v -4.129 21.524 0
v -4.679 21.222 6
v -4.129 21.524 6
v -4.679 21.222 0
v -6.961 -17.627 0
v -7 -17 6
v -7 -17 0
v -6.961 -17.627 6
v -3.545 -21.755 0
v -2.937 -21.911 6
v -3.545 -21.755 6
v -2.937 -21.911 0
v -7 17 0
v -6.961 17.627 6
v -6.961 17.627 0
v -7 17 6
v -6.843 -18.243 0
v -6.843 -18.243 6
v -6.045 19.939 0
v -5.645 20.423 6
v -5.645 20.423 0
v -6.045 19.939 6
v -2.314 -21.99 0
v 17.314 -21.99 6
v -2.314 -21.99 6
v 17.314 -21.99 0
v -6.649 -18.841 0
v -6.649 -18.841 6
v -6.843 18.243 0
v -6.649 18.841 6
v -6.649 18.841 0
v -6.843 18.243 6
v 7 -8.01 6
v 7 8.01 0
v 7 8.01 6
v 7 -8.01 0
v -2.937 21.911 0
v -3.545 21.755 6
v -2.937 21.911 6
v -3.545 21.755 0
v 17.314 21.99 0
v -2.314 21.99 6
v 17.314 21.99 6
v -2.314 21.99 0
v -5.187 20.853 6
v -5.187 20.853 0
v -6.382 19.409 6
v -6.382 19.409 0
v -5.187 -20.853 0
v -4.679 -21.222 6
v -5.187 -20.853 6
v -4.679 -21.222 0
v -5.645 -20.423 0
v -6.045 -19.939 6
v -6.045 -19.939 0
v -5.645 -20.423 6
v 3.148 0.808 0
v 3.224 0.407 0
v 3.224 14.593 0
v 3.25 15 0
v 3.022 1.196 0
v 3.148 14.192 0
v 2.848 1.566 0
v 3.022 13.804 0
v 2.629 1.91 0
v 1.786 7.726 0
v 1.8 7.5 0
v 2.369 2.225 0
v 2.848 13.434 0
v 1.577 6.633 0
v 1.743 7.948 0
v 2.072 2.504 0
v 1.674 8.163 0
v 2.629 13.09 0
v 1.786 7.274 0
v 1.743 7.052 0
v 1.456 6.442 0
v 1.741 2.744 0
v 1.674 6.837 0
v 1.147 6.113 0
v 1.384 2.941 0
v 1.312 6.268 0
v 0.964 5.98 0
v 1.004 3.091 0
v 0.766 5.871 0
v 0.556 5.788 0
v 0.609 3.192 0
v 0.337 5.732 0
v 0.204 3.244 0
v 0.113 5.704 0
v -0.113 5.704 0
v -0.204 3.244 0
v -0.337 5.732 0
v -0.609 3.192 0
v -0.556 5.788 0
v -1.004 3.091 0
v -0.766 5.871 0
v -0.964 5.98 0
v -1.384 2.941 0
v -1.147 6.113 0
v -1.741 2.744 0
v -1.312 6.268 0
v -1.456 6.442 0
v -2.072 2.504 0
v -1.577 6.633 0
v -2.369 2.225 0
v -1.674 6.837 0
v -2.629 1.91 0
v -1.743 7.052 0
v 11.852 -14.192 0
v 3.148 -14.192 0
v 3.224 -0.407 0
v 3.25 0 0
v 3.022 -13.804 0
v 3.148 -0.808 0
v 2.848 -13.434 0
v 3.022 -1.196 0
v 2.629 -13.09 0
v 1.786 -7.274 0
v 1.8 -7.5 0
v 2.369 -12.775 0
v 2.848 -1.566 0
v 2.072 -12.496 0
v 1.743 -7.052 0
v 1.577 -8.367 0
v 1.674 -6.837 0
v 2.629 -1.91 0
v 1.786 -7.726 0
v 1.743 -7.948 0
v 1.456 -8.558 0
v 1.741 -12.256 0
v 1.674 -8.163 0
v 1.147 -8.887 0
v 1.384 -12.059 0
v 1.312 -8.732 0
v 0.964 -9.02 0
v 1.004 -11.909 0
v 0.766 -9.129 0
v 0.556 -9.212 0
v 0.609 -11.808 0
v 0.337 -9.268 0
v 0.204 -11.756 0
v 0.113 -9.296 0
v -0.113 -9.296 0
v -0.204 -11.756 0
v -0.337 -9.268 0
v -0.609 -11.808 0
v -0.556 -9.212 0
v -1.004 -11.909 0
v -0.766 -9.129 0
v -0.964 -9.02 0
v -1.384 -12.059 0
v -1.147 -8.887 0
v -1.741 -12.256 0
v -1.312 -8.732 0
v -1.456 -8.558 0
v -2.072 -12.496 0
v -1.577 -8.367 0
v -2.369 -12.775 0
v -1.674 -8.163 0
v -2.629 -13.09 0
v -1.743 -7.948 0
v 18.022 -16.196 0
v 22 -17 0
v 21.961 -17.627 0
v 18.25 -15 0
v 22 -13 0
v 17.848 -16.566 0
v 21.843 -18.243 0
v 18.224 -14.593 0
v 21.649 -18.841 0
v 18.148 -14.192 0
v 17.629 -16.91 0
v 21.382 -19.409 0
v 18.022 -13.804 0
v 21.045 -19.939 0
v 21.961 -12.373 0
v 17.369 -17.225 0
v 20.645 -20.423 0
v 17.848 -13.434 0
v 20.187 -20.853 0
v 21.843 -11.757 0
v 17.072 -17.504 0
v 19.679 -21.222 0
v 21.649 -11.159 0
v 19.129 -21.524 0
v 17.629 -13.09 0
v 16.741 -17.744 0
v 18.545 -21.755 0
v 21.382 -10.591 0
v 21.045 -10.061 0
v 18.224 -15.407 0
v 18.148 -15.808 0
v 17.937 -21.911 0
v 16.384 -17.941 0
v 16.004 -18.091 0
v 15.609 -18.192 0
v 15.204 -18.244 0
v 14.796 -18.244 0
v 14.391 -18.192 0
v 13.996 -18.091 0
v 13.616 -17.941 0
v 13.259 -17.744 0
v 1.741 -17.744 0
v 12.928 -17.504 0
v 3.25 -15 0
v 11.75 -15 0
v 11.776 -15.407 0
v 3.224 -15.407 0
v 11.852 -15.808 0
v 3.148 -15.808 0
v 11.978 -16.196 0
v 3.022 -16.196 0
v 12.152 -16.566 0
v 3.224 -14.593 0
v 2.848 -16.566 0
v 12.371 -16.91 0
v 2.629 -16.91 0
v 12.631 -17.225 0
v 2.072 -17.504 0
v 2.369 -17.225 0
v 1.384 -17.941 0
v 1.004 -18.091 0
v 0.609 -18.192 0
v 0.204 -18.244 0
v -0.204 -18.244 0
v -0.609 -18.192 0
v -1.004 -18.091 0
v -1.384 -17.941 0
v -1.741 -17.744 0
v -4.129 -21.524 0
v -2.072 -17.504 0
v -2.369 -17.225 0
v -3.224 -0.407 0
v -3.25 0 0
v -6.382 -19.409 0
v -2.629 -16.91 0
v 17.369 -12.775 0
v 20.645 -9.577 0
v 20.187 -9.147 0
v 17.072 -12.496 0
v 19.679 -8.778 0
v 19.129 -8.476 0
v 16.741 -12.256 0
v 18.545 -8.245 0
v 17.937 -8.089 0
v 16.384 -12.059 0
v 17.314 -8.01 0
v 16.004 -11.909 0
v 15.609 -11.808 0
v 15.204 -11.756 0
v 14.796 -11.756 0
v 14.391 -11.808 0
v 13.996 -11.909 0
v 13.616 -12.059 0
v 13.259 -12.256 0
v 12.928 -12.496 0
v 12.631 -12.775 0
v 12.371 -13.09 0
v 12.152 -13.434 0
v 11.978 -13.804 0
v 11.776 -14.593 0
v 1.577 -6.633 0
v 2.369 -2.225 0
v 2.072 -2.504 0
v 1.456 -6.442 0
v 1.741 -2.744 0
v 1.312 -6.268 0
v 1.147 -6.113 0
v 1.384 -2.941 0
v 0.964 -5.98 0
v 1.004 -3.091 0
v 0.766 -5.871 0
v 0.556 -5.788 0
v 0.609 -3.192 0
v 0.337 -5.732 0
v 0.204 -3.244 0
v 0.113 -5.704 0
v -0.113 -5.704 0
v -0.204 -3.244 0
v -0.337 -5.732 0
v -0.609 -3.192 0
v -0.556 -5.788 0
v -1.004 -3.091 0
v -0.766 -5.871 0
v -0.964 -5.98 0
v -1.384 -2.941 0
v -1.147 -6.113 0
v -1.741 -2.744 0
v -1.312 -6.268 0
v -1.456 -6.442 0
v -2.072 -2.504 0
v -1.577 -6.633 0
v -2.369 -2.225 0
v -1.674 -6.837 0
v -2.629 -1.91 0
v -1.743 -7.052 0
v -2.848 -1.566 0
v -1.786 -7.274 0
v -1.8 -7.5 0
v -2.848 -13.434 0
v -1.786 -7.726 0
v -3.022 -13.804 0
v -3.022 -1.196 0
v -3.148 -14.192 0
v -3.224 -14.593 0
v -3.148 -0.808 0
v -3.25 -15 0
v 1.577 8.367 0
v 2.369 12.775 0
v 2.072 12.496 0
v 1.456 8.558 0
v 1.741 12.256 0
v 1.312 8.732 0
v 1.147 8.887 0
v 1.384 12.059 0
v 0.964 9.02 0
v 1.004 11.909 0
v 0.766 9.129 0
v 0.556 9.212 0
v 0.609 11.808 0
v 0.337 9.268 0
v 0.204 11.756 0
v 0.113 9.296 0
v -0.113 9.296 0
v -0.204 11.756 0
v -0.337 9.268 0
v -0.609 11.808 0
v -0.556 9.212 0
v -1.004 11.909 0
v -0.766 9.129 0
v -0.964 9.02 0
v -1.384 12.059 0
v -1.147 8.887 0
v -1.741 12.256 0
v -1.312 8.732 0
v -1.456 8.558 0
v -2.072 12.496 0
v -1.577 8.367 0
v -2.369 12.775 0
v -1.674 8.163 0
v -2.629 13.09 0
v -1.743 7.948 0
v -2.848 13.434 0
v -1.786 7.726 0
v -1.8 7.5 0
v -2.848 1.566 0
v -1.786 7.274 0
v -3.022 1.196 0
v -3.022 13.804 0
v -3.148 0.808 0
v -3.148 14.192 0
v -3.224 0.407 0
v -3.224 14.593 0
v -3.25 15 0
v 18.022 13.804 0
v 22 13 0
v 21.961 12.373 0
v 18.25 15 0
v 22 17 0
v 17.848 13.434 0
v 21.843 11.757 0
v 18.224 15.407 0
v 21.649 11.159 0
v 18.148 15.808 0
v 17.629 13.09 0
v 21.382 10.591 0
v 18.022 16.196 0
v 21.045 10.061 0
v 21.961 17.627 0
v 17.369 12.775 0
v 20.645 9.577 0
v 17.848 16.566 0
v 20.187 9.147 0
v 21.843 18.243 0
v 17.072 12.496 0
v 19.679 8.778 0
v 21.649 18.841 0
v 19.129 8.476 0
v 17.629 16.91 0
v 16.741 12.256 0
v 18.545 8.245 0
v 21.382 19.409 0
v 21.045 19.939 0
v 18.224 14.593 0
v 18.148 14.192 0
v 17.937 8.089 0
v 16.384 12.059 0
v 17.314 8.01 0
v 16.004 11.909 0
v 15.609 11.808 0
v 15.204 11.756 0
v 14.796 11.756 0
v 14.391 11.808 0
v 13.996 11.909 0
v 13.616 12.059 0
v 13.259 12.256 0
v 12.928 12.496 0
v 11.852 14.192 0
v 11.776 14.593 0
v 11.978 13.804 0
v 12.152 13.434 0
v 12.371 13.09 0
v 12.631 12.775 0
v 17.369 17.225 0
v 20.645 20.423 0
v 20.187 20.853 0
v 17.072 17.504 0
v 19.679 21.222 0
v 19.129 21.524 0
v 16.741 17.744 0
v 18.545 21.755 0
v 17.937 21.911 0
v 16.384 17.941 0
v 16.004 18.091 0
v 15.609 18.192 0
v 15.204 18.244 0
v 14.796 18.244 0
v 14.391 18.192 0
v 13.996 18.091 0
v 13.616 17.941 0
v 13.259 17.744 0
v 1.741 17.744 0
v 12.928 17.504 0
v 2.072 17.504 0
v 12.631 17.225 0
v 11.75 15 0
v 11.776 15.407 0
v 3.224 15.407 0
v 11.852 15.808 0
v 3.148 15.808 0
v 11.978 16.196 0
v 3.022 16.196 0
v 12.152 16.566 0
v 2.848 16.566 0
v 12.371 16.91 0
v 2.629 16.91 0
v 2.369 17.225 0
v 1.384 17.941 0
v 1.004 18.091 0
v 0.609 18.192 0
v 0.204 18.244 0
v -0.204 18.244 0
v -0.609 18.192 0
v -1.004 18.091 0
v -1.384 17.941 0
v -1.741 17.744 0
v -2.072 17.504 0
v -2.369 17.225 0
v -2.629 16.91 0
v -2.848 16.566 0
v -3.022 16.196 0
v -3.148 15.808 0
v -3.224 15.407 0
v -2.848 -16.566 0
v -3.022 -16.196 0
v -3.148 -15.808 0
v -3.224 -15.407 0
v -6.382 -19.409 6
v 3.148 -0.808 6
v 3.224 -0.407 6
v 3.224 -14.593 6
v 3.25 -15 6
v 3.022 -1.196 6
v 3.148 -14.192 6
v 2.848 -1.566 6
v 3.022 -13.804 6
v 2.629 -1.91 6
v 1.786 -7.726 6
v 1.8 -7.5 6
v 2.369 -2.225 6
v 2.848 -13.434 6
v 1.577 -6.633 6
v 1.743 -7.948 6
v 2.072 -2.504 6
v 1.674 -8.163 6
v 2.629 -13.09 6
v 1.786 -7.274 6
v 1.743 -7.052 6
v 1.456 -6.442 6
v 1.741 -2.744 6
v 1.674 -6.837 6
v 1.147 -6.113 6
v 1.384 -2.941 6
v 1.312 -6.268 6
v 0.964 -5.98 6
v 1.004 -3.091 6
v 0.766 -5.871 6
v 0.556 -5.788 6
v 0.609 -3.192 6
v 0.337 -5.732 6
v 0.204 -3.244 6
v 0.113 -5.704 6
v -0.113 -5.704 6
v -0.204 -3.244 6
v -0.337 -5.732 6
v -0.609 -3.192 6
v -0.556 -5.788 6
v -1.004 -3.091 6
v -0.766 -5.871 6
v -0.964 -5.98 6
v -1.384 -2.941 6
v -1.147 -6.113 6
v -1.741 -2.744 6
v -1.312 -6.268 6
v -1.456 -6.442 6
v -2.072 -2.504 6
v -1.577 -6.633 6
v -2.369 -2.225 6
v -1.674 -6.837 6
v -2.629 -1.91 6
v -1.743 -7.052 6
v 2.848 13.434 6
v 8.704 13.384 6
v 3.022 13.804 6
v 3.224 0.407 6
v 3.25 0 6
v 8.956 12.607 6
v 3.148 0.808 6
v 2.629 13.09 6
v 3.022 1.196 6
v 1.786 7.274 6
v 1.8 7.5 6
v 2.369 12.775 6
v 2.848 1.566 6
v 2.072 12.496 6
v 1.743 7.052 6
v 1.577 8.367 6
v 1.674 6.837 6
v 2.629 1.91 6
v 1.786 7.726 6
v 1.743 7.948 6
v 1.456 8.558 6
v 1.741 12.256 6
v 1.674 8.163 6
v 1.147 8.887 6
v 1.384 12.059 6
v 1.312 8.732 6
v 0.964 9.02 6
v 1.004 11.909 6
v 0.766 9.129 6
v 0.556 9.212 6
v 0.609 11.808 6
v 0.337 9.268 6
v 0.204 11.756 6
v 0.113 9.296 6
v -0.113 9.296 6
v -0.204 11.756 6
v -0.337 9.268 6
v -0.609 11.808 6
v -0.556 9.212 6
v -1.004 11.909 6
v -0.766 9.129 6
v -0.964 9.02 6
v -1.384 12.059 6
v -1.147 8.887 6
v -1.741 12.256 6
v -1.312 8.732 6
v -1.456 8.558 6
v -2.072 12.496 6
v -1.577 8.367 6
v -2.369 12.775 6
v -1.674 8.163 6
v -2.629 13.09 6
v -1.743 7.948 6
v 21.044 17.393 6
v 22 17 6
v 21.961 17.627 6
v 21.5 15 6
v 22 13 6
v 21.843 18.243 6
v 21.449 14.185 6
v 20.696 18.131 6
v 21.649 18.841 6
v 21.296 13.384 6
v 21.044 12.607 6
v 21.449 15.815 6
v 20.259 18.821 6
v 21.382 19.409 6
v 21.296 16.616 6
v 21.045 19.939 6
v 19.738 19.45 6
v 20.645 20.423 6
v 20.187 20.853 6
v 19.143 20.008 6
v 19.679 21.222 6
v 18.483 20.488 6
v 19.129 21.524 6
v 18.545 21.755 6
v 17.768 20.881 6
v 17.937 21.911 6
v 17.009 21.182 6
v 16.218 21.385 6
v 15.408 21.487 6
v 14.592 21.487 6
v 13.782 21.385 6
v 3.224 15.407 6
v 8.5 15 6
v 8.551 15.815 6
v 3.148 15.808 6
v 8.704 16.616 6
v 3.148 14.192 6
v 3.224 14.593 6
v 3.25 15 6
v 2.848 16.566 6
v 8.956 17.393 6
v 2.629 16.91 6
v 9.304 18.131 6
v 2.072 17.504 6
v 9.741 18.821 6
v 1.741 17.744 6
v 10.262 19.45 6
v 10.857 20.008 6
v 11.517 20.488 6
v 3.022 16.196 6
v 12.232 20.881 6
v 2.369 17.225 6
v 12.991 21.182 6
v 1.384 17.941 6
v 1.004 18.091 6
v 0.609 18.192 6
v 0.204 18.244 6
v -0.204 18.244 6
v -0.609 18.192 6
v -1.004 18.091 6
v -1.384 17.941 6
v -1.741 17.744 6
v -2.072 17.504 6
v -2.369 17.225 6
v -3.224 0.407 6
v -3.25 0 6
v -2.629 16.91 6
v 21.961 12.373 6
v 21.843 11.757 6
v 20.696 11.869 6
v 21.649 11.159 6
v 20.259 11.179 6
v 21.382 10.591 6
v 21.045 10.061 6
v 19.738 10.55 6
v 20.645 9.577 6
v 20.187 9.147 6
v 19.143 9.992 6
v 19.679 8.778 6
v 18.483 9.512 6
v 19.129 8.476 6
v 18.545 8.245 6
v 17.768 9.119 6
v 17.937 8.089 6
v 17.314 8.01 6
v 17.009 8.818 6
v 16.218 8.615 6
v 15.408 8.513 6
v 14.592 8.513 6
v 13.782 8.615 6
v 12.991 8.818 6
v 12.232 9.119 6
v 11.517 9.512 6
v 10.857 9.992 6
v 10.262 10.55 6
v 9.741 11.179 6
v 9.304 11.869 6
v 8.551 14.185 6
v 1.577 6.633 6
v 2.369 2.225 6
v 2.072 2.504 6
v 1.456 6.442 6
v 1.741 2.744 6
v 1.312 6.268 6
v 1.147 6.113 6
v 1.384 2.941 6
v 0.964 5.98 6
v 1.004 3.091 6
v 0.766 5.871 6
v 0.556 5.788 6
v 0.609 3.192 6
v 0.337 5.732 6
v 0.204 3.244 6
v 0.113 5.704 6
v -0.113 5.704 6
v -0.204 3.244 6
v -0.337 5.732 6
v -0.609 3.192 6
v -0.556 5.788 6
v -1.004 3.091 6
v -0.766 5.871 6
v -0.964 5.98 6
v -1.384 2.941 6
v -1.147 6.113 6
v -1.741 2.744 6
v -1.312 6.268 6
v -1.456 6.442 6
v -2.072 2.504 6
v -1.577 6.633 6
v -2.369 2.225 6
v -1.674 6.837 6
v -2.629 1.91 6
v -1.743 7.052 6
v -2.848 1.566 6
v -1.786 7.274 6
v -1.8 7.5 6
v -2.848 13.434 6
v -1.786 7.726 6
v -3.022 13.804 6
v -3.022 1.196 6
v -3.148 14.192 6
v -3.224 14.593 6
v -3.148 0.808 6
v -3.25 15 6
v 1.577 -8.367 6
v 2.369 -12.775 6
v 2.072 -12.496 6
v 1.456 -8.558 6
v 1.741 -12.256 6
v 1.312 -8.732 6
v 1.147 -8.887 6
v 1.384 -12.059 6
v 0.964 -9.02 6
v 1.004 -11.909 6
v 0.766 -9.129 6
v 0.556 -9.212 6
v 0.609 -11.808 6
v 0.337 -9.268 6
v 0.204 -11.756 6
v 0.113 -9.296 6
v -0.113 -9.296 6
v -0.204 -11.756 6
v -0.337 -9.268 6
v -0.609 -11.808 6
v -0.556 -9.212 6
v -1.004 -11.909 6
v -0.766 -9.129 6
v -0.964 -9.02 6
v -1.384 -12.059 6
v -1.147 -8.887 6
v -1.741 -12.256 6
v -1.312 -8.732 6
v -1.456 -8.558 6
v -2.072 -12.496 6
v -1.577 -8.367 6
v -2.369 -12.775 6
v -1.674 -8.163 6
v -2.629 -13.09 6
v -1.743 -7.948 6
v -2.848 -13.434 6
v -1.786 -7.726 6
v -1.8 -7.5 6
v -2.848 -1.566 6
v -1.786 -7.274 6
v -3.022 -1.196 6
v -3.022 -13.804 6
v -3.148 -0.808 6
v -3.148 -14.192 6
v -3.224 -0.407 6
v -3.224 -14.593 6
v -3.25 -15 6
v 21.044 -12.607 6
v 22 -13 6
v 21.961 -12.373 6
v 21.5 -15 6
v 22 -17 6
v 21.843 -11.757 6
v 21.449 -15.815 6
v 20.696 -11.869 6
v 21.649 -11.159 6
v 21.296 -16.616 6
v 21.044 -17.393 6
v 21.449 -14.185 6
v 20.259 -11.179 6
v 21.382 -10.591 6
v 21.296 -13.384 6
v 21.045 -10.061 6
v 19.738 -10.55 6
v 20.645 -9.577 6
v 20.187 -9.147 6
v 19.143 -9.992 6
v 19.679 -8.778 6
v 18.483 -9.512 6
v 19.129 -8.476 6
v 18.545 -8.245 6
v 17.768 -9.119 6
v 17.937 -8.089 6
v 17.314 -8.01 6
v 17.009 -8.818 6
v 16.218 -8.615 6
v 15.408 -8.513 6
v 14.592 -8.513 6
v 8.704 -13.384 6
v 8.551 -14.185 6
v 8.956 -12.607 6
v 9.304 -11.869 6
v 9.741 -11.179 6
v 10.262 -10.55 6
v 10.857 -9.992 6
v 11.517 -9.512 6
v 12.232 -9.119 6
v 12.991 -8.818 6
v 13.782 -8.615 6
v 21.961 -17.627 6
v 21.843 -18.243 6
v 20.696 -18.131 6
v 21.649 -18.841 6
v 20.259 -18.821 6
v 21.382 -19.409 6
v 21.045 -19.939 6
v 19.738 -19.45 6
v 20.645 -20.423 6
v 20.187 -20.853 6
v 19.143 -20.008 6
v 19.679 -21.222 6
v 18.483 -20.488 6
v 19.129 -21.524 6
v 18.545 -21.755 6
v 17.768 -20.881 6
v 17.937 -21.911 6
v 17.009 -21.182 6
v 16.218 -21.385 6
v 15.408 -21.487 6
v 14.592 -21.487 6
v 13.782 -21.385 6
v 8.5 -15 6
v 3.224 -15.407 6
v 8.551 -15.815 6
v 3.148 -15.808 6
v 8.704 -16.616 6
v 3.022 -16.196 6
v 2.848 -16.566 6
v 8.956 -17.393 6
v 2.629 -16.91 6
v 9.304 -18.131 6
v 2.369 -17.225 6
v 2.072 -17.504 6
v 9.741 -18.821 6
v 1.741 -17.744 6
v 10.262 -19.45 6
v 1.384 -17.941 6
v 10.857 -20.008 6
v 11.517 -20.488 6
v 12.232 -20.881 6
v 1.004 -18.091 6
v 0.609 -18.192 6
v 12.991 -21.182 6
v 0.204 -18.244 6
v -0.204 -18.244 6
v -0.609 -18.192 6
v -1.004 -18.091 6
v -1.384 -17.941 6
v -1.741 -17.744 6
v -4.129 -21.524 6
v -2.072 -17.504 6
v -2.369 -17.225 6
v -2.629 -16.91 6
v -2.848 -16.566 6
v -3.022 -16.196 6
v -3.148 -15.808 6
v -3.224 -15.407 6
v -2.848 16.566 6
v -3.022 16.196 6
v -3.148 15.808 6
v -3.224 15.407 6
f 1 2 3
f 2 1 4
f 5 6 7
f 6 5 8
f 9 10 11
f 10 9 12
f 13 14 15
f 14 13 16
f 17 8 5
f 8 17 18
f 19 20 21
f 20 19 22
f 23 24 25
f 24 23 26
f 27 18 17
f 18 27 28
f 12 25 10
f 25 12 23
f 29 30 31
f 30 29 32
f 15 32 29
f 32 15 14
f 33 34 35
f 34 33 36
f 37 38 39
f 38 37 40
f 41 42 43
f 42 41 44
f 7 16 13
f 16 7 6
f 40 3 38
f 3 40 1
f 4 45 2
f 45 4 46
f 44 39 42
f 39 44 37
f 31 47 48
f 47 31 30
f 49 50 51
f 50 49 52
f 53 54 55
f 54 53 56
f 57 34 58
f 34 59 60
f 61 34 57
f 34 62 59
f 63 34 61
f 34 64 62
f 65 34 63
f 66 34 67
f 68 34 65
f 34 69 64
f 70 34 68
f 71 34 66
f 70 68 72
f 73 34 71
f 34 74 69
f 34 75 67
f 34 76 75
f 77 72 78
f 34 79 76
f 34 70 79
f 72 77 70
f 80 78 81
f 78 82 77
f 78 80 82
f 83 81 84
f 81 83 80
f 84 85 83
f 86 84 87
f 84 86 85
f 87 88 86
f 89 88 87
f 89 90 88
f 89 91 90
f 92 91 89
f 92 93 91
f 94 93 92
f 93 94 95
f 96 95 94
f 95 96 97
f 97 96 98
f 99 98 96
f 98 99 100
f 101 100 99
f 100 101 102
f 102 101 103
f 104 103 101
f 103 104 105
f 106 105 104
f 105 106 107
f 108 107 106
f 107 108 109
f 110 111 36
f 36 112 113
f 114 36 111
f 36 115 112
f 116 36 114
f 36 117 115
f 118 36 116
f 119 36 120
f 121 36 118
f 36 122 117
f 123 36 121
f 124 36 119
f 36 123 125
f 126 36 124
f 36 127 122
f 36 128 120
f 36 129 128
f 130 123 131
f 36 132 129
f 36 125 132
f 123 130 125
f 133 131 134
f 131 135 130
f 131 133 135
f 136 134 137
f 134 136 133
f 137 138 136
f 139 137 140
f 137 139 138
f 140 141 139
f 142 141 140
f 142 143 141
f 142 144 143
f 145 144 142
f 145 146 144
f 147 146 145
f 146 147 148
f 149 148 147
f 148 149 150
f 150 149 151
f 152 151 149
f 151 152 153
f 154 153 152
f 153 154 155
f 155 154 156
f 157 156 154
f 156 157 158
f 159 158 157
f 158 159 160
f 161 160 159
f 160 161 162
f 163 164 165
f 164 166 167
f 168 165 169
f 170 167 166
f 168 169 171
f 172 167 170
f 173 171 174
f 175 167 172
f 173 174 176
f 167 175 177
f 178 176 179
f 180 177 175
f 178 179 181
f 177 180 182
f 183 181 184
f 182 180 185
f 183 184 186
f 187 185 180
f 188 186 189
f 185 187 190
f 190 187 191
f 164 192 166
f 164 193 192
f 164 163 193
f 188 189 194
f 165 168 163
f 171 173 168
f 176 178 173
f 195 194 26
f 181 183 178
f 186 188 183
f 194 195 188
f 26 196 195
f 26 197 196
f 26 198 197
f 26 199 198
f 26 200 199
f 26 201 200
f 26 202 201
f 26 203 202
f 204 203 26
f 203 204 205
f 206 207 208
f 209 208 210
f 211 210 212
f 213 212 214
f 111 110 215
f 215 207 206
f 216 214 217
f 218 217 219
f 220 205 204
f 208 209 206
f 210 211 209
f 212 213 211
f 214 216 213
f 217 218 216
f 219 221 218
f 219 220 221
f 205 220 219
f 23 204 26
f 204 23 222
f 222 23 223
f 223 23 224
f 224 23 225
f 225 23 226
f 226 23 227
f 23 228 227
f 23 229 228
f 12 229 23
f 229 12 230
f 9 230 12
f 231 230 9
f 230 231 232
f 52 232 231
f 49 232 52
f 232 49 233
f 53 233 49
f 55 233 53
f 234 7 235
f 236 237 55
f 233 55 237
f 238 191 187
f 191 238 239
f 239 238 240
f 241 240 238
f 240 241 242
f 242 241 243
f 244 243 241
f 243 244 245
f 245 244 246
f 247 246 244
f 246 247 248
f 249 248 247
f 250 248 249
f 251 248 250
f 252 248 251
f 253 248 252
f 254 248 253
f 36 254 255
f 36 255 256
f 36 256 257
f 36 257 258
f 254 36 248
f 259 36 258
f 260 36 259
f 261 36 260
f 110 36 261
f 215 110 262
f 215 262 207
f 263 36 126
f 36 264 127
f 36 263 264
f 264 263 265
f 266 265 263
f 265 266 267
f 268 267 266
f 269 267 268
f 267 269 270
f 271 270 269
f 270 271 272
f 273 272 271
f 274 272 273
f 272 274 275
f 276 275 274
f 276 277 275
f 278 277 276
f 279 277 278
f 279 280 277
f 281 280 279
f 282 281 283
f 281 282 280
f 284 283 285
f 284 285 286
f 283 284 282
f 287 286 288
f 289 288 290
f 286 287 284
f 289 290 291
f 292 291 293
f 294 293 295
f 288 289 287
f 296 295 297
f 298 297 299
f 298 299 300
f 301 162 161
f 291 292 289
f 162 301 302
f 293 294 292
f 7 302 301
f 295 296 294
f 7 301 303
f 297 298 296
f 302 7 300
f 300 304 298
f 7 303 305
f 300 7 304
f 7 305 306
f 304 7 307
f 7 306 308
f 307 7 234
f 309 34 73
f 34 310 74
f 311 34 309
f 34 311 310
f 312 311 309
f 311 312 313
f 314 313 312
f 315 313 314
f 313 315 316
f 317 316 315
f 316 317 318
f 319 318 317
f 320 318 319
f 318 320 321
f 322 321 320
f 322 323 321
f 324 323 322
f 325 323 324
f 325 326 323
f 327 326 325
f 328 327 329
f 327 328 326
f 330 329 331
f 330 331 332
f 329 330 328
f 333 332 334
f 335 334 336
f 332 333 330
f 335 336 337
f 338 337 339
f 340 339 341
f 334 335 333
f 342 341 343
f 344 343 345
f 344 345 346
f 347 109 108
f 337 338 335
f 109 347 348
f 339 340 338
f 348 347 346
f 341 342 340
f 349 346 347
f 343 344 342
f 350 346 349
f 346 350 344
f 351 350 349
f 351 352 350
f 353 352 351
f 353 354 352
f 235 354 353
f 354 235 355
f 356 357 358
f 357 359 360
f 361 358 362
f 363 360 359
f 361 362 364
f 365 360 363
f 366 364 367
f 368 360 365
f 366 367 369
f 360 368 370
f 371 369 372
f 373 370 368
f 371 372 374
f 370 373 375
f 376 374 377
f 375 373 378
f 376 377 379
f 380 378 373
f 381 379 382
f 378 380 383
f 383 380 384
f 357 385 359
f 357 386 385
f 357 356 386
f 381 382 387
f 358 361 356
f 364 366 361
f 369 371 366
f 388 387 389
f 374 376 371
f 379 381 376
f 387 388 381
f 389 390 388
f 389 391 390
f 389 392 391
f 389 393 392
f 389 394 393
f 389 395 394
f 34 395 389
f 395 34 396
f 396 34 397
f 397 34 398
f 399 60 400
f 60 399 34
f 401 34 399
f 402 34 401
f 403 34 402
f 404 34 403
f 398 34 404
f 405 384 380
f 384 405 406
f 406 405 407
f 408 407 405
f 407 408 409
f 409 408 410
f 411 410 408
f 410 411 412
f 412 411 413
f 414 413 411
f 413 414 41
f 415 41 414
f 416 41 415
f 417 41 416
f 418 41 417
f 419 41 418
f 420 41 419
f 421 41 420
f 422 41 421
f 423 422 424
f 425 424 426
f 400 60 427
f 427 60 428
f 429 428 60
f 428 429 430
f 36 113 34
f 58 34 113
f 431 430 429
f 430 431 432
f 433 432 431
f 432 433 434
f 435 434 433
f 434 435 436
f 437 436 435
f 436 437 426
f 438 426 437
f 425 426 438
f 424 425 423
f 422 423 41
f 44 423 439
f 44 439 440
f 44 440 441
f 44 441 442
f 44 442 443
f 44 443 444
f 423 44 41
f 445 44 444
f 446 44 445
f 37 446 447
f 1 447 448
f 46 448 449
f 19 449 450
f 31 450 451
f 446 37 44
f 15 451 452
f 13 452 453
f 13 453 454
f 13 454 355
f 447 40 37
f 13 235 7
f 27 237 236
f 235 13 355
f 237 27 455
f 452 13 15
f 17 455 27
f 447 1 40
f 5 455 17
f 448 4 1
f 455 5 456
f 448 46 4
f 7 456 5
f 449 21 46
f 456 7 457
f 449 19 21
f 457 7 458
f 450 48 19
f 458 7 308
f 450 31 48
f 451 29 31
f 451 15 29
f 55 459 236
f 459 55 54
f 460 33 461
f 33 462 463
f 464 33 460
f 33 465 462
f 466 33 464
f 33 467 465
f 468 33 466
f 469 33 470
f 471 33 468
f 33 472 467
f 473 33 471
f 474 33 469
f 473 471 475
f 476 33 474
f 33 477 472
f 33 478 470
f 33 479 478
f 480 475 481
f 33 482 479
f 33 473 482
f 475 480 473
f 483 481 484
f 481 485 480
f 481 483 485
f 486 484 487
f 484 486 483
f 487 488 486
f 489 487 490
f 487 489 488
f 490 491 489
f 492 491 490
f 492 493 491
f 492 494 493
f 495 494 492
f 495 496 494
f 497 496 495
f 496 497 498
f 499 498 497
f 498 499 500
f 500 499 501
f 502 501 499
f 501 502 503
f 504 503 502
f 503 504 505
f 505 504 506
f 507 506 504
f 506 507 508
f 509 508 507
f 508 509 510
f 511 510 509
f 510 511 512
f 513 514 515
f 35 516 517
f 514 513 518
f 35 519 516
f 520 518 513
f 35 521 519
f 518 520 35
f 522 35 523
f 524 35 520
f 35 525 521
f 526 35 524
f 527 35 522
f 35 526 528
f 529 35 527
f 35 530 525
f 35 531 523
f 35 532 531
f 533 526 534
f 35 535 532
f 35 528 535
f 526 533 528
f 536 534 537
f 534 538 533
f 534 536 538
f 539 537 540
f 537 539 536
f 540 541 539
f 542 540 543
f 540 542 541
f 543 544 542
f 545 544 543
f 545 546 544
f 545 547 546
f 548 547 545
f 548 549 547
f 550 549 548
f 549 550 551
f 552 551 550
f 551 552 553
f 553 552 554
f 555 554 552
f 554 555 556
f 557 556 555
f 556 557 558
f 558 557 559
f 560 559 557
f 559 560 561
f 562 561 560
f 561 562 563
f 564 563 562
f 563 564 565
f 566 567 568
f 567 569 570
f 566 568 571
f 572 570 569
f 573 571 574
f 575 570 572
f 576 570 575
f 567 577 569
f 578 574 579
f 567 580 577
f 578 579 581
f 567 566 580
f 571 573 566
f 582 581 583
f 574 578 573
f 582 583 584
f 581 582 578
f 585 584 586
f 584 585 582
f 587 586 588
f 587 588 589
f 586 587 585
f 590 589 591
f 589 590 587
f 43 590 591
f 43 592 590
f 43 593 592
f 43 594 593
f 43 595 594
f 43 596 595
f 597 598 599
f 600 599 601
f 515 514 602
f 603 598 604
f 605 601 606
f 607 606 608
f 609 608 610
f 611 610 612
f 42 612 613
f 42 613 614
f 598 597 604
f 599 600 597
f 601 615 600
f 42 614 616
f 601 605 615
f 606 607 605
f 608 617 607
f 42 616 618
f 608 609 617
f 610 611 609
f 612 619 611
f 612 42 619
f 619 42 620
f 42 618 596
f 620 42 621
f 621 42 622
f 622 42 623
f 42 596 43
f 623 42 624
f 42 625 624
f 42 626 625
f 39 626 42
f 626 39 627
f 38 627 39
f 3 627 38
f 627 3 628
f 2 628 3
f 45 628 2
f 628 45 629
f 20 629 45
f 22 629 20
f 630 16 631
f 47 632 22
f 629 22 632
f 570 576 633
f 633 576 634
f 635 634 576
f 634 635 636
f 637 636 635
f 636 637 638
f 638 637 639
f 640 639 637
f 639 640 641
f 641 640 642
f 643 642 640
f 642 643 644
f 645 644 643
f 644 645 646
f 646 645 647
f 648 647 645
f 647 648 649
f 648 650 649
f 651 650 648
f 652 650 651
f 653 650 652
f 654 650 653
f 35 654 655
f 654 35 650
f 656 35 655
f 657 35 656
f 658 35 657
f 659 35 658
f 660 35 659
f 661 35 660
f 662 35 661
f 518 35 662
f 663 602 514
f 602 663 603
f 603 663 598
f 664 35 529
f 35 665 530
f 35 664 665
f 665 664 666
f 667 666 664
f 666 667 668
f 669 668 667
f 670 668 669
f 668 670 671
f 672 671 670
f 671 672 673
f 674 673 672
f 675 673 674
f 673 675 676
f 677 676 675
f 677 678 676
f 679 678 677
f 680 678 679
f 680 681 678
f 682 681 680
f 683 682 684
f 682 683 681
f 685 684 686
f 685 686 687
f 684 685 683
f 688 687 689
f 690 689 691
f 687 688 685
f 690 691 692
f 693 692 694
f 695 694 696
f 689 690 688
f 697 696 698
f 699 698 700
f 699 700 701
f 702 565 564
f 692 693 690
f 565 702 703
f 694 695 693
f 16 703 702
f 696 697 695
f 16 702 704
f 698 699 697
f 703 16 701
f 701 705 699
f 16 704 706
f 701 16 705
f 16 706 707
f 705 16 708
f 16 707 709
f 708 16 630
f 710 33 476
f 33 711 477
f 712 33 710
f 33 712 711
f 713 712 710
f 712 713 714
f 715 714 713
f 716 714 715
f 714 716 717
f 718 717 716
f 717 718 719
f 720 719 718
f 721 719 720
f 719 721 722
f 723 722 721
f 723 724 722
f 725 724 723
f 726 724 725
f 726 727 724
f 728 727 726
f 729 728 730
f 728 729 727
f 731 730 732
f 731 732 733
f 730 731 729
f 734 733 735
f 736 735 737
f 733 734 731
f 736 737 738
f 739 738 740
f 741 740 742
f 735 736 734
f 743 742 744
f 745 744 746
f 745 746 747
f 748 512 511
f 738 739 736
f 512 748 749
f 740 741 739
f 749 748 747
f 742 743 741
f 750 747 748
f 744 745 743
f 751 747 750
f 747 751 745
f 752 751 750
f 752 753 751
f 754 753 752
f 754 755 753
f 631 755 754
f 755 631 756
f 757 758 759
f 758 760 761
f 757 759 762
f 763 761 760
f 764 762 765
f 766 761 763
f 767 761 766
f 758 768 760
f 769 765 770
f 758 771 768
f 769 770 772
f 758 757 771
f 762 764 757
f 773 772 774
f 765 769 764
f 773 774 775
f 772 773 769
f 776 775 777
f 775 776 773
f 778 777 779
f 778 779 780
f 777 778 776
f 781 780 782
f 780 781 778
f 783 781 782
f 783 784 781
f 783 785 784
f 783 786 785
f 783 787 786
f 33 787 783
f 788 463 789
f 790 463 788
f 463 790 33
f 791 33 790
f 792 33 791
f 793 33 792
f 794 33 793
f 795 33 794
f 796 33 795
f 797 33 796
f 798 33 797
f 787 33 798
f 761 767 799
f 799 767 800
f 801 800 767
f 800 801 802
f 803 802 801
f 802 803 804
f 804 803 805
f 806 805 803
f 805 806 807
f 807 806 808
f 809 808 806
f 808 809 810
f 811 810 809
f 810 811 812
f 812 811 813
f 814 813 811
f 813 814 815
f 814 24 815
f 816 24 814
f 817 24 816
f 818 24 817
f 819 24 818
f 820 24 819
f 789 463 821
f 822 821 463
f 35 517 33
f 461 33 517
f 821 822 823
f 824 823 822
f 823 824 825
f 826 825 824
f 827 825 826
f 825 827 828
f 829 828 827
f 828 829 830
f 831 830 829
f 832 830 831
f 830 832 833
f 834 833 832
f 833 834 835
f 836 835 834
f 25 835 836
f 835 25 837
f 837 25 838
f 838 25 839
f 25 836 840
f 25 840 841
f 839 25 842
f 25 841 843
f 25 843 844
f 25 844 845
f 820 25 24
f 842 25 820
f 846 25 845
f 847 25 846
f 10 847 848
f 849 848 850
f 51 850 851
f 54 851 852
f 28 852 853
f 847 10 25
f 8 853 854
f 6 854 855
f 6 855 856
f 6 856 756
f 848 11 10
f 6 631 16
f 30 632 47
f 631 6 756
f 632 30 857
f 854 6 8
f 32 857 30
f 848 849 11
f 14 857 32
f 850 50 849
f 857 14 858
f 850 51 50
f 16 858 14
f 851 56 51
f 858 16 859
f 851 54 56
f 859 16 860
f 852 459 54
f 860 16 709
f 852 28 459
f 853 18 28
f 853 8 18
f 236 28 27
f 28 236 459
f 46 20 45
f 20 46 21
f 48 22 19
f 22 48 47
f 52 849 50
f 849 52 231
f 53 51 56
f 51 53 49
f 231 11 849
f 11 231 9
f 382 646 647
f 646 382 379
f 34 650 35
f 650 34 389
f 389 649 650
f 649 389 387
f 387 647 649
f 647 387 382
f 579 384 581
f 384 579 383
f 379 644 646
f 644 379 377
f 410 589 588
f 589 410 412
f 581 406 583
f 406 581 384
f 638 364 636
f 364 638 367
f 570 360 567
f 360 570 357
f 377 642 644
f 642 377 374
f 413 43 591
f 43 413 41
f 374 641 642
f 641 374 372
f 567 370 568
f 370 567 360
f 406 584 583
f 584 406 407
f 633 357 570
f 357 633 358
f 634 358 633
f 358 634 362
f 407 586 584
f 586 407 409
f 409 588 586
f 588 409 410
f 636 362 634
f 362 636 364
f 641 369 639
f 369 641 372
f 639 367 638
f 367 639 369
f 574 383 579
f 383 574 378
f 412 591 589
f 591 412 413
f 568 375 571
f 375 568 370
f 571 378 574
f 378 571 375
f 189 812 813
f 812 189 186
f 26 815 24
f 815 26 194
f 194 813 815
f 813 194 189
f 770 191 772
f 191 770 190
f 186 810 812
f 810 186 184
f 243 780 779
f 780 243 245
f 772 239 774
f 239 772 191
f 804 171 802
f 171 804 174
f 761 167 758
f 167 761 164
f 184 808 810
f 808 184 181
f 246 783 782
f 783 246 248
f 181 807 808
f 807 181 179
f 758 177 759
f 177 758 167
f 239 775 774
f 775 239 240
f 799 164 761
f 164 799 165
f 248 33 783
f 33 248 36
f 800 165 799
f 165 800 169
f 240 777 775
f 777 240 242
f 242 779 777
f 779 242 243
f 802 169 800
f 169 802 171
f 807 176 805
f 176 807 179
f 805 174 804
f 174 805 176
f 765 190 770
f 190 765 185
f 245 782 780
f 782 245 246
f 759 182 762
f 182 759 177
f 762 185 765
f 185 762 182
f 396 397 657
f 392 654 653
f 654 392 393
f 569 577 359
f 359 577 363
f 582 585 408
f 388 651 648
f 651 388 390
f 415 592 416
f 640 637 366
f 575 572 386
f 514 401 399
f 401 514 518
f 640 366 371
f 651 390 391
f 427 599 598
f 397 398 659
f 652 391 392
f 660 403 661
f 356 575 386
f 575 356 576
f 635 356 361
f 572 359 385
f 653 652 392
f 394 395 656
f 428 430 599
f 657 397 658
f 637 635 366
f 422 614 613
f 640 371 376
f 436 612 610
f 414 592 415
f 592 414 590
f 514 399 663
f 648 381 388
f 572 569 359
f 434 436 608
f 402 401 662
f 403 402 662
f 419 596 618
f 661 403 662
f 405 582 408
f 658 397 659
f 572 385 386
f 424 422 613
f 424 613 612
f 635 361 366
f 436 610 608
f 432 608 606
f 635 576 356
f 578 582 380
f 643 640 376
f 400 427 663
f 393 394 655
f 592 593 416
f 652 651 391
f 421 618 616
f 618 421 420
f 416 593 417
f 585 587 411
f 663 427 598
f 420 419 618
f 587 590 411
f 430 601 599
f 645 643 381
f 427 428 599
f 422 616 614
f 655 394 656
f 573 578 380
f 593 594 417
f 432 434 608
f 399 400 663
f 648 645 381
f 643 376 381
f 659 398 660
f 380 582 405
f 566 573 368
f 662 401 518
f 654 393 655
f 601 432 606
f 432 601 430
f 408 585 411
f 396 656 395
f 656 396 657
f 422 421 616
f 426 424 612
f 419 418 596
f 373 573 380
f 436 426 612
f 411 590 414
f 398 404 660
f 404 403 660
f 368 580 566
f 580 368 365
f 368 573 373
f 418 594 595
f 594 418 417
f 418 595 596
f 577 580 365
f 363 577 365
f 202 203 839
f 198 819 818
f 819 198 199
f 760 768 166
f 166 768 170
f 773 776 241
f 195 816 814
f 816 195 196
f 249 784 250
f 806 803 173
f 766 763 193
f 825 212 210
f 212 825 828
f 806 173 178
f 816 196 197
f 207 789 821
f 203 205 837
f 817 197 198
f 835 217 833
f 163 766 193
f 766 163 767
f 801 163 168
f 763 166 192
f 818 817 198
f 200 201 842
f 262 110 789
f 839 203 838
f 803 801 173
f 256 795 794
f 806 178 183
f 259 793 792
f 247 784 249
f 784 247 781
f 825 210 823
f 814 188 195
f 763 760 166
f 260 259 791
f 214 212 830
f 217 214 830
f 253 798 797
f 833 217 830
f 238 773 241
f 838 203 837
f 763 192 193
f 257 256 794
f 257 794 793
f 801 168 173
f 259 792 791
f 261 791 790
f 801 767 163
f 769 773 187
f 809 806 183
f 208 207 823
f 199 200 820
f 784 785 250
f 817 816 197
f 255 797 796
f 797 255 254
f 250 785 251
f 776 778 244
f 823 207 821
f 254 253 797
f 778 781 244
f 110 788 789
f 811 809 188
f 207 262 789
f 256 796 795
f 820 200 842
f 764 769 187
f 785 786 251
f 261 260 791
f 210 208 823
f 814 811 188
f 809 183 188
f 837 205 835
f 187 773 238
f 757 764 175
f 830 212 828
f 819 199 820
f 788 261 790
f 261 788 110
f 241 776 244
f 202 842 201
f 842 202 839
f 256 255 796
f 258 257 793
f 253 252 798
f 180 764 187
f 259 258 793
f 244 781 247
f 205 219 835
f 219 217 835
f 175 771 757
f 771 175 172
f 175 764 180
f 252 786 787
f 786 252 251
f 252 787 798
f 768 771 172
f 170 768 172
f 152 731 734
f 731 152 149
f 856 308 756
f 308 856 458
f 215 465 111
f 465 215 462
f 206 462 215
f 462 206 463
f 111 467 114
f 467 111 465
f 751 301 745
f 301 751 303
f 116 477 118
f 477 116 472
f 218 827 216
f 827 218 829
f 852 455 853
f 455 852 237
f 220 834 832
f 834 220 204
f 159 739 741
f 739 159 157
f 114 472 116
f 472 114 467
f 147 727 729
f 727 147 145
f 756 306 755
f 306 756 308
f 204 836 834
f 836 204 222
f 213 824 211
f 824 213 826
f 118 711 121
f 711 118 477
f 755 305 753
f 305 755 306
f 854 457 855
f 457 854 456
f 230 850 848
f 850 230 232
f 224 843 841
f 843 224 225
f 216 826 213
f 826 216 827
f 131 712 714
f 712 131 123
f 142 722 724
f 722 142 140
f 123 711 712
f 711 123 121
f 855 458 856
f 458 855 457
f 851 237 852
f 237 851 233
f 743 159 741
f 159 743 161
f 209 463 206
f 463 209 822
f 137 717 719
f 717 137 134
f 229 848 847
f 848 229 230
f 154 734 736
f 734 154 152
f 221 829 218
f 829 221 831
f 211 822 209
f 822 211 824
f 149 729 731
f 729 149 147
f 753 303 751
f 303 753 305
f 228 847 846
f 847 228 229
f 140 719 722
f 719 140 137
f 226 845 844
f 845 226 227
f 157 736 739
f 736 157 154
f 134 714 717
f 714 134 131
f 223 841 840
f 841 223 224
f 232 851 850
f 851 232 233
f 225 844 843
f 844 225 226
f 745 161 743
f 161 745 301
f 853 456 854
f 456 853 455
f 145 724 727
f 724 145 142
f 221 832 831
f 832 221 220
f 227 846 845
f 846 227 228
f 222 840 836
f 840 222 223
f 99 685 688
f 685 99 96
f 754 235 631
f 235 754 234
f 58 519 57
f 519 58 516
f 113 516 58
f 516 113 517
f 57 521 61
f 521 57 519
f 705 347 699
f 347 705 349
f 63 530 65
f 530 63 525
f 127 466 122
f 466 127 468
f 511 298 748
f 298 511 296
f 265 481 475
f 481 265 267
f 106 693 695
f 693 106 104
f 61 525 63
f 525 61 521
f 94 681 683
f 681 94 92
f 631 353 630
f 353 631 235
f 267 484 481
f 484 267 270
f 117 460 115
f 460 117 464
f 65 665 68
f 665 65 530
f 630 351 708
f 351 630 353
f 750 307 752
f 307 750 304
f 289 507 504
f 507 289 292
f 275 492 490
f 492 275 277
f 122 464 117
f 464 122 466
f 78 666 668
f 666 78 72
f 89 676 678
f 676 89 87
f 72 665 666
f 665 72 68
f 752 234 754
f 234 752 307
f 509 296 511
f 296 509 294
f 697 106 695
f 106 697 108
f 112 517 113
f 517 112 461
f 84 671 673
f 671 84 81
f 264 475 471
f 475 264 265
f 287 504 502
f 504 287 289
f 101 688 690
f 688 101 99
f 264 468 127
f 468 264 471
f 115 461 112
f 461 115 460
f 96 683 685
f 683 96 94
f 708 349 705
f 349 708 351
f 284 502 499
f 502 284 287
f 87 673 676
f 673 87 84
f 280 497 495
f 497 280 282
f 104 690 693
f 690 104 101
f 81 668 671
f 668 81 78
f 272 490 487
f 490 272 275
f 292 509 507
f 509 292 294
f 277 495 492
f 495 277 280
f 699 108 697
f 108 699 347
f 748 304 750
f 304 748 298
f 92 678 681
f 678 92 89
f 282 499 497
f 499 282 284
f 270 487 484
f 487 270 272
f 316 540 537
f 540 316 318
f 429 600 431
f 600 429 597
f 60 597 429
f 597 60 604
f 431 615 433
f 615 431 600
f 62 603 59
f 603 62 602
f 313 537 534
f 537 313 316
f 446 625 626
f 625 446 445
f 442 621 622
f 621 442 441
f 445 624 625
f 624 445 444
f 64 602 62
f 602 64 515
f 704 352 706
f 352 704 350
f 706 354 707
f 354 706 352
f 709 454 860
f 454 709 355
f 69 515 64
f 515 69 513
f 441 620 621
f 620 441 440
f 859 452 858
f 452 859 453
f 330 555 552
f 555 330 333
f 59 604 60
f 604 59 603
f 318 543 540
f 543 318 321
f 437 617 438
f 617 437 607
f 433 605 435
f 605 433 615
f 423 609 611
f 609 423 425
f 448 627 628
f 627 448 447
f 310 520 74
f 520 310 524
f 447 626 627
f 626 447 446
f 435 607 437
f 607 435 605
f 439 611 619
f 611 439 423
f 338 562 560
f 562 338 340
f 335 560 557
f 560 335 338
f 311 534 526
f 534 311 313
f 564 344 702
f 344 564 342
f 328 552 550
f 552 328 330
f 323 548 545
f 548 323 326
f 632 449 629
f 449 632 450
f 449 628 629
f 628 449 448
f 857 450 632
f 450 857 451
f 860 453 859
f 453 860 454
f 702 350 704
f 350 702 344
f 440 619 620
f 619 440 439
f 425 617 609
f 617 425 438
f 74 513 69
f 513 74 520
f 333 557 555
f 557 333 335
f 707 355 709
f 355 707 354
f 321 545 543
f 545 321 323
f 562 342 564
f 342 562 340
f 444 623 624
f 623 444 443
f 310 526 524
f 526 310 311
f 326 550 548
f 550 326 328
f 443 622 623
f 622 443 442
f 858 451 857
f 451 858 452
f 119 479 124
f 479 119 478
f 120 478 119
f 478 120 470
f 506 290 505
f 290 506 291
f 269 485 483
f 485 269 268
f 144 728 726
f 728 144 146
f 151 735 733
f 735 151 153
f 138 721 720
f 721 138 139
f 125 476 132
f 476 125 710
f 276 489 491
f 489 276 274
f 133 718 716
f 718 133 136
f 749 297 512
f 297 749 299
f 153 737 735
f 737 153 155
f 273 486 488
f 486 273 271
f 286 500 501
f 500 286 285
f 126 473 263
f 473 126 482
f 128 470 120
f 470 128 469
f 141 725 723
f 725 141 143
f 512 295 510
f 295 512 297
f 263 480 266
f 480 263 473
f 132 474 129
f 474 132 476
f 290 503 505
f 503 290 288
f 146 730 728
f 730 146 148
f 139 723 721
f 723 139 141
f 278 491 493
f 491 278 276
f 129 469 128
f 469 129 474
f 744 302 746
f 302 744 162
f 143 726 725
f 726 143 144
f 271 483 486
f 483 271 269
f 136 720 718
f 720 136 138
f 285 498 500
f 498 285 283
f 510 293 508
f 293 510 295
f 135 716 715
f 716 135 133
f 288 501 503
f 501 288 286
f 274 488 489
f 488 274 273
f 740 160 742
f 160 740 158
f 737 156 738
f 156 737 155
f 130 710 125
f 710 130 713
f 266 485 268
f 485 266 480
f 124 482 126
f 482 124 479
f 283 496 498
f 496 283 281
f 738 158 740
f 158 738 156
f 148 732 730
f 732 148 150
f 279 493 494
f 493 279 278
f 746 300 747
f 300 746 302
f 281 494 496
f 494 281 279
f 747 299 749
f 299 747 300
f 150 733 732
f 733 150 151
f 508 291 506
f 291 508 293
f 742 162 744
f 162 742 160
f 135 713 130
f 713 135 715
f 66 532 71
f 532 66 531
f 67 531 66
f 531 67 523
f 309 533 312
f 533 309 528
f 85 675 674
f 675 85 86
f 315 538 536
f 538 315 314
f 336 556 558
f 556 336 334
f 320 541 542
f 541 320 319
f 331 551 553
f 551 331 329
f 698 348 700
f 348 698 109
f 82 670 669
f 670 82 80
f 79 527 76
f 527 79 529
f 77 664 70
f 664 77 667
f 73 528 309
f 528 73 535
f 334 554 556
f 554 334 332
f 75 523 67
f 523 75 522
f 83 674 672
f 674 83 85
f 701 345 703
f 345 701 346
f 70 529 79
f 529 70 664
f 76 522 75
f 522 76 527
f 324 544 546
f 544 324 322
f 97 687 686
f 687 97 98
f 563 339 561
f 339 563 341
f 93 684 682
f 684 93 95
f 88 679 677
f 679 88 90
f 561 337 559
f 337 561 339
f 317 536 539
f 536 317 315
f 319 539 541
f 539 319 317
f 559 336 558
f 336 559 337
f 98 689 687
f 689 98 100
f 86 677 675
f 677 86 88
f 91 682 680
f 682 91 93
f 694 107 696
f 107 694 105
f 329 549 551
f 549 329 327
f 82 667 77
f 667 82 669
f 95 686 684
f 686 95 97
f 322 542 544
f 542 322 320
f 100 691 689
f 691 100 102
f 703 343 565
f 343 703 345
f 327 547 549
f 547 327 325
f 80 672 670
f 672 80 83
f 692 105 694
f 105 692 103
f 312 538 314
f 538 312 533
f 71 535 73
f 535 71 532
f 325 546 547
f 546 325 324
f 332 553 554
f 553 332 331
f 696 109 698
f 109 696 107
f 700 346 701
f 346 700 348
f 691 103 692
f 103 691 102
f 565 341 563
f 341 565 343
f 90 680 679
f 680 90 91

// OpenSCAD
$fn = 50;


difference() {
	union() {
		hull() {
			translate(v = [-2.0000000000, 17.0000000000, 0]) {
				cylinder(h = 6, r = 5);
			}
			translate(v = [2.0000000000, 17.0000000000, 0]) {
				cylinder(h = 6, r = 5);
			}
			translate(v = [-2.0000000000, -17.0000000000, 0]) {
				cylinder(h = 6, r = 5);
			}
			translate(v = [2.0000000000, -17.0000000000, 0]) {
				cylinder(h = 6, r = 5);
			}
		}
		translate(v = [7.5000000000, 15.0000000000, 0]) {
			hull() {
				translate(v = [-9.5000000000, 2.0000000000, 0]) {
					cylinder(h = 6, r = 5);
				}
				translate(v = [9.5000000000, 2.0000000000, 0]) {
					cylinder(h = 6, r = 5);
				}
				translate(v = [-9.5000000000, -2.0000000000, 0]) {
					cylinder(h = 6, r = 5);
				}
				translate(v = [9.5000000000, -2.0000000000, 0]) {
					cylinder(h = 6, r = 5);
				}
			}
		}
		translate(v = [7.5000000000, -15.0000000000, 0]) {
			hull() {
				translate(v = [-9.5000000000, 2.0000000000, 0]) {
					cylinder(h = 6, r = 5);
				}
				translate(v = [9.5000000000, 2.0000000000, 0]) {
					cylinder(h = 6, r = 5);
				}
				translate(v = [-9.5000000000, -2.0000000000, 0]) {
					cylinder(h = 6, r = 5);
				}
				translate(v = [9.5000000000, -2.0000000000, 0]) {
					cylinder(h = 6, r = 5);
				}
			}
		}
	}
	union() {
		translate(v = [15.0000000000, 15.0000000000, 6]) {
			rotate(a = [0, 0, 0]) {
				difference() {
					union() {
						#translate(v = [0, 0, -6.0000000000]) {
							cylinder(h = 6, r = 2.2500000000);
						}
						#translate(v = [0, 0, -6]) {
							cylinder(h = 6, r1 = 3.2500000000, r2 = 6.5000000000);
						}
						#translate(v = [0, 0, -6.0000000000]) {
							cylinder(h = 6, r = 3.2500000000);
						}
						#translate(v = [0, 0, -6.0000000000]) {
							cylinder(h = 6, r = 2.2500000000);
						}
					}
					union();
				}
			}
		}
		translate(v = [15.0000000000, -15.0000000000, 6]) {
			rotate(a = [0, 0, 0]) {
				difference() {
					union() {
						#translate(v = [0, 0, -6.0000000000]) {
							cylinder(h = 6, r = 2.2500000000);
						}
						#translate(v = [0, 0, -6]) {
							cylinder(h = 6, r1 = 3.2500000000, r2 = 6.5000000000);
						}
						#translate(v = [0, 0, -6.0000000000]) {
							cylinder(h = 6, r = 3.2500000000);
						}
						#translate(v = [0, 0, -6.0000000000]) {
							cylinder(h = 6, r = 2.2500000000);
						}
					}
					union();
				}
			}
		}
		translate(v = [0.0000000000, -15.0000000000, 0]) {
			translate(v = [0, 0, -100]) {
				cylinder(h = 200, r = 3.2500000000);
			}
		}
		translate(v = [0, 0, -100]) {
			cylinder(h = 200, r = 3.2500000000);
		}
		translate(v = [0.0000000000, 15.0000000000, 0]) {
			translate(v = [0, 0, -100]) {
				cylinder(h = 200, r = 3.2500000000);
			}
		}
		translate(v = [0.0000000000, -15.0000000000, 0]) {
			translate(v = [0, 0, -100]) {
				cylinder(h = 200, r = 1.8000000000);
			}
		}
		translate(v = [0.0000000000, -7.5000000000, 0]) {
			translate(v = [0, 0, -100]) {
				cylinder(h = 200, r = 1.8000000000);
			}
		}
		translate(v = [0, 0, -100]) {
			cylinder(h = 200, r = 1.8000000000);
		}
		translate(v = [0.0000000000, 7.5000000000, 0]) {
			translate(v = [0, 0, -100]) {
				cylinder(h = 200, r = 1.8000000000);
			}
		}
		translate(v = [0.0000000000, 15.0000000000, 0]) {
			translate(v = [0, 0, -100]) {
				cylinder(h = 200, r = 1.8000000000);
			}
		}
	}
}
